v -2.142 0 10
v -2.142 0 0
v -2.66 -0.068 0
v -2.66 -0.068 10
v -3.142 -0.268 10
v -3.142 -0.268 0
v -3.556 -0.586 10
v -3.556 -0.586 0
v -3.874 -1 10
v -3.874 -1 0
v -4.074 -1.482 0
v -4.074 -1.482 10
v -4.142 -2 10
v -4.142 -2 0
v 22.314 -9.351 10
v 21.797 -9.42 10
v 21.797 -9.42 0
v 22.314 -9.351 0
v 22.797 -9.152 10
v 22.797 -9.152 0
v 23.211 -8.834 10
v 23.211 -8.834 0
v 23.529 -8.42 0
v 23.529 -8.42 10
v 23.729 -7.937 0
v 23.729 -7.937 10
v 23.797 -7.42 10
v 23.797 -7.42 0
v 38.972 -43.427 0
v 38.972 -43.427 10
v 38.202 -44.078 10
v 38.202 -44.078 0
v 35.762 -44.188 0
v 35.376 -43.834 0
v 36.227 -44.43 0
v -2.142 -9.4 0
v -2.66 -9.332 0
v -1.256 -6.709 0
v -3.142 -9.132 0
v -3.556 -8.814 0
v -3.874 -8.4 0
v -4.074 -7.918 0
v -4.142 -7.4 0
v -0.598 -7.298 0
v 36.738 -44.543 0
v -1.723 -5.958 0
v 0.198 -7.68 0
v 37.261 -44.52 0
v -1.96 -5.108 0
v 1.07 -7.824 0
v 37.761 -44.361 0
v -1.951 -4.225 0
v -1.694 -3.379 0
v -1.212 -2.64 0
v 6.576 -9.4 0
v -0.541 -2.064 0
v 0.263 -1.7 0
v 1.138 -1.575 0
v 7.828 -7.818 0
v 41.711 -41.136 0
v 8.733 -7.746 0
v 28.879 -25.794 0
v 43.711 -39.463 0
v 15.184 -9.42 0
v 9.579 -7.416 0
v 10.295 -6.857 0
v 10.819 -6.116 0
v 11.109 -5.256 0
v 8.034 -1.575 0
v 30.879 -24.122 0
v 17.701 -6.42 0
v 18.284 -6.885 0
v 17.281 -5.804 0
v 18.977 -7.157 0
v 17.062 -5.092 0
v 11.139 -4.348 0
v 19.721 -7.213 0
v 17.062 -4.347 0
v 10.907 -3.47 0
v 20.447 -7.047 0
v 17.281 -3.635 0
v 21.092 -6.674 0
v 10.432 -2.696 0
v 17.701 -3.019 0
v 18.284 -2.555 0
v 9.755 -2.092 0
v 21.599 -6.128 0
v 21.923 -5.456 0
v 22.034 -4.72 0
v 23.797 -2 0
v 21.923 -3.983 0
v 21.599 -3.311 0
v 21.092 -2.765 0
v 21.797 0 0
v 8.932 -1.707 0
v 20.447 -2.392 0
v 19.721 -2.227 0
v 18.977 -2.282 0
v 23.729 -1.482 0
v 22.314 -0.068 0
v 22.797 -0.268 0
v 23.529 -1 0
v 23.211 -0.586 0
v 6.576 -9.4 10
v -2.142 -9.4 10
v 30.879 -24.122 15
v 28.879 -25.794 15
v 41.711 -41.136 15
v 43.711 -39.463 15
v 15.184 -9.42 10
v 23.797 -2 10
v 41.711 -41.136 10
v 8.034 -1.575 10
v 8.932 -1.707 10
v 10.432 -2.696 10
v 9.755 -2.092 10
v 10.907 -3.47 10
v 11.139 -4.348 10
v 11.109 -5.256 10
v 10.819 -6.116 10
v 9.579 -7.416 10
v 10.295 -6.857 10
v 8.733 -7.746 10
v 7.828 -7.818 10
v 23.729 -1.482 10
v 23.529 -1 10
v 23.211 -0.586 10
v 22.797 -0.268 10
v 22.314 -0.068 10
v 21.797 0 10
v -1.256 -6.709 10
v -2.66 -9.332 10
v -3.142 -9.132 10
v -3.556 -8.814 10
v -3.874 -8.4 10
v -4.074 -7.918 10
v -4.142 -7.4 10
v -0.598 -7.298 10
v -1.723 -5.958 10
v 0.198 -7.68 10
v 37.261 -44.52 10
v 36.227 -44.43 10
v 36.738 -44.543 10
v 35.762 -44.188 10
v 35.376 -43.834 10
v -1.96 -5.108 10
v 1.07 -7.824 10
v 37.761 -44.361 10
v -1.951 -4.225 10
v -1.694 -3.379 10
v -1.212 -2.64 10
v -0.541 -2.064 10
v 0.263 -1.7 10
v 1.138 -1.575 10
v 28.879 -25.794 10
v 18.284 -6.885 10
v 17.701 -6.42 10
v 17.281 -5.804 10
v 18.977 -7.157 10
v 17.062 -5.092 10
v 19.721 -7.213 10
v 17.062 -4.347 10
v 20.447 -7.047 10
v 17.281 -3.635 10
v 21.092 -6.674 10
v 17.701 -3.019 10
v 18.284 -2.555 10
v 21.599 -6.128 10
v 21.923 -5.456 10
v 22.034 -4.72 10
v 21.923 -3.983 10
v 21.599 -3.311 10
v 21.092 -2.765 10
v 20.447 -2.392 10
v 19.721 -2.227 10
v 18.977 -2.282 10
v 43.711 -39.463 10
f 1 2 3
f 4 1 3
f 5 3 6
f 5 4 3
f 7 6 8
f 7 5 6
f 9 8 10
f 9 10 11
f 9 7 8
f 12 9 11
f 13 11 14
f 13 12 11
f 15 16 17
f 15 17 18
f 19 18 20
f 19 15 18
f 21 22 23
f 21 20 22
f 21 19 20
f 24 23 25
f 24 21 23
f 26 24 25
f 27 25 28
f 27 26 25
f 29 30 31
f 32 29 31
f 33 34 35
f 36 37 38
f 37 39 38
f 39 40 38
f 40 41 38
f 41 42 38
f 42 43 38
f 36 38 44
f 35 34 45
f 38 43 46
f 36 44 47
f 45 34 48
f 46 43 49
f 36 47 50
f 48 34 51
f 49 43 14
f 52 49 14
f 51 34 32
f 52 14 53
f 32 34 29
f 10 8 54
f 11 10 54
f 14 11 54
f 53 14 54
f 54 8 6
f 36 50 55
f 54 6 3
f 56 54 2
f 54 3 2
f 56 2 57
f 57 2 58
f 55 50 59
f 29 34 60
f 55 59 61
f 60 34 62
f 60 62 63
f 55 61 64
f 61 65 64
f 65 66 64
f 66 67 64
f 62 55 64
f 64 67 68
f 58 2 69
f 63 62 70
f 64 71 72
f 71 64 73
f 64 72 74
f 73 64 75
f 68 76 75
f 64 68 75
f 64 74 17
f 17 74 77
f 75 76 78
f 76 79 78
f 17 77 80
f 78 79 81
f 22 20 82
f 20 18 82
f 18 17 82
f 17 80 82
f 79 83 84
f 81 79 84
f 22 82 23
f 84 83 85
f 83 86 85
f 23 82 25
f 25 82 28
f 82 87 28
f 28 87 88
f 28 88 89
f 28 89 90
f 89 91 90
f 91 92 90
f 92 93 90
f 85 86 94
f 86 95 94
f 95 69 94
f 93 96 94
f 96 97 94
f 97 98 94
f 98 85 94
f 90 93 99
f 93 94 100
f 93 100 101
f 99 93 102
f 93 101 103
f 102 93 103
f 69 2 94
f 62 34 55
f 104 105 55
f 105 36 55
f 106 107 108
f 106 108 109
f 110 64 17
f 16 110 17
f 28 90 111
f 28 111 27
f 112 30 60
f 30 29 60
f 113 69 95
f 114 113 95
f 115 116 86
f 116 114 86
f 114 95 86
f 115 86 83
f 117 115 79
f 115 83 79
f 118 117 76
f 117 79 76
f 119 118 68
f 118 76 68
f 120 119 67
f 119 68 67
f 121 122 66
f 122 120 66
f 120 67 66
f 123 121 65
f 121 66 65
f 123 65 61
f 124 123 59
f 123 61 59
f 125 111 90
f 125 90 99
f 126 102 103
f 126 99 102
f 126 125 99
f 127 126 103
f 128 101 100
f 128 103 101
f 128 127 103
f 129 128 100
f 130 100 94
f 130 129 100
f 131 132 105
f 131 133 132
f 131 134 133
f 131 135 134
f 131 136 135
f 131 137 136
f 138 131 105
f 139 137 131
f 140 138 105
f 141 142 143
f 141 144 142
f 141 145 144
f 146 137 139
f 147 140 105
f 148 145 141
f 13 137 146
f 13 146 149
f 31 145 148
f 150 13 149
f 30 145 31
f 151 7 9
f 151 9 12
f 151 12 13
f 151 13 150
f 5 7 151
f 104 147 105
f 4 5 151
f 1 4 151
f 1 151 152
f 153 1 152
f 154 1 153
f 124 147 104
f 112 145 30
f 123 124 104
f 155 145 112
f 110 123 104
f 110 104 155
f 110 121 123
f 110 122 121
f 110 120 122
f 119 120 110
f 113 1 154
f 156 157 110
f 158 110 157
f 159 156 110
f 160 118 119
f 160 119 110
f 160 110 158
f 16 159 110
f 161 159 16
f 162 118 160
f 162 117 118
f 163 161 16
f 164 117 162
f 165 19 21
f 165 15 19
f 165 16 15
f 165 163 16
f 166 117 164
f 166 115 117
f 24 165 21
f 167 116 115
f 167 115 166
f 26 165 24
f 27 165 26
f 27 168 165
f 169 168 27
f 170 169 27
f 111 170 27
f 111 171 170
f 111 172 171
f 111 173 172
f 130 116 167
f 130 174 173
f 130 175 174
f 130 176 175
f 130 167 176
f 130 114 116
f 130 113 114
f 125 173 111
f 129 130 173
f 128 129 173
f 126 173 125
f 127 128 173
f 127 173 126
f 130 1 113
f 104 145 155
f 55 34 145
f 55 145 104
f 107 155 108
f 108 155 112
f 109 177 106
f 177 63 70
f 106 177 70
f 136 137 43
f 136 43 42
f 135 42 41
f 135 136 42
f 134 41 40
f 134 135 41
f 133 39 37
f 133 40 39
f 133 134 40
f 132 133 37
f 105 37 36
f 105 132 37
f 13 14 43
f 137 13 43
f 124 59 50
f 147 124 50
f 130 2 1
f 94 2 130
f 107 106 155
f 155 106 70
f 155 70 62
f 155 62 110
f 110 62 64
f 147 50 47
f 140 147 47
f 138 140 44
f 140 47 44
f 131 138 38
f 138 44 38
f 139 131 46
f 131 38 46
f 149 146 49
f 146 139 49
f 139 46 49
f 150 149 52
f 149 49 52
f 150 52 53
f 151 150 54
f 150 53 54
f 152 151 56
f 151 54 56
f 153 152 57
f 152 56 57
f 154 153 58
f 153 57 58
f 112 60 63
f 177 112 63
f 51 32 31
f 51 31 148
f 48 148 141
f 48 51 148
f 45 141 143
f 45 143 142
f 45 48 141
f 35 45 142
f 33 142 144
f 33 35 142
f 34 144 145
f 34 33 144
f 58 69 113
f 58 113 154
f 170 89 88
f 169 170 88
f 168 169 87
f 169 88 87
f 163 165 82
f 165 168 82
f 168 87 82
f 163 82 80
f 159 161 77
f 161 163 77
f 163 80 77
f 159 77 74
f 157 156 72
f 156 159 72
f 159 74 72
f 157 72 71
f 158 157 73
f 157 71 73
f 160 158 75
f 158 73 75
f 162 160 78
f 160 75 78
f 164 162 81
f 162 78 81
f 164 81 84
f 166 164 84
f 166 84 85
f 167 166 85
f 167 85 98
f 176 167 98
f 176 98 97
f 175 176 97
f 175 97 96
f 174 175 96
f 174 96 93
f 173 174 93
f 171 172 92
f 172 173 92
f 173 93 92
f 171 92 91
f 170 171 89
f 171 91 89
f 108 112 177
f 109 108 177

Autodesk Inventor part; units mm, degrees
ref_plane "YZ Plane" through (0, 0, 0) normal (1, 0, 0) x (0, 1, 0)
ref_plane "XZ Plane" through (0, 0, 0) normal (0, 1, 0) x (-1, 0, 0)
ref_plane "XY Plane" through (0, 0, 0) normal (0, 0, 1) x (1, 0, 0)
sketch "スケッチ1" plane through (0, 0, 0) normal (0, 0, 1) x (1, 0, 0)
  line L0 (18.408, 0) -> (-1.0303, 0)
  arc A0 (36.165, -44.7764) -> (37.2594, -44.8743) centre (37.0041, -41.5628) ccw
  line L1 (38.972, -43.427) -> (37.2594, -44.8743)
  line L2 (31.483, -28.9072) -> (15.1835, -9.4196)
  circle A1 centre (19.5337, -4.7196) radius 2.5
  line L3 (8.0337, -1.575) -> (1.1379, -1.575)
  arc A2 (7.8277, -7.8182) -> (8.0337, -1.575) centre (8.0337, -4.7) ccw
  line L4 (7.8277, -7.8182) -> (1.0695, -7.8243)
  arc A3 (1.1379, -1.575) -> (1.0695, -7.8243) centre (1.1379, -4.7) ccw
  line L5 (36.165, -44.7764) -> (6.576, -9.4)
  line L6 (18.408, 0) -> (23.7968, 0)
  line L7 (23.7968, 0) -> (23.7968, -8.35)
  line L8 (-1.0303, 0) -> (-4.1421, 0)
  line L9 (-4.1421, 0) -> (-4.1421, -7.7348)
  line L10 (-4.1421, -7.7348) -> (-4.1421, -9.4)
  line L11 (-4.1421, -9.4) -> (6.576, -9.4)
  line L12 (15.1835, -9.4196) -> (23.7968, -9.4196)
  line L13 (23.7968, -9.4196) -> (23.7968, -7.7545)
  line L14 (41.7112, -41.1359) -> (41.7109, -41.1356)
  line L15 (41.7109, -41.1356) -> (43.7109, -39.4628)
  line L16 (43.7109, -39.4628) -> (30.8794, -24.1216)
  line L17 (30.8794, -24.1216) -> (28.8794, -25.7944)
  line L18 (38.972, -43.427) -> (41.7112, -41.1359)
  line L19 (31.483, -28.9072) -> (41.7112, -41.1359)
  point P0 (0, 0)
  point P1 (0, 0)
  dimension "d0" = 5
  dimension "d1" = 3.125
  dimension "d3" = 11.5
  dimension "d5" = 4.7
  dimension "d9" = 3.125
  dimension "d11" = 4.7
  dimension "d12" = 4.7
  dimension "d13" = 6.8958
  dimension "d14" = 20
  dimension "d19" = 2
  dimension "d24" = 46.1194
  dimension "d25" = 41.3474
extrude "押し出し1" add sketch "スケッチ1" along normal blind 10
fillet "フィレット1" radius 2 4 edges at (23.7968, 0, 5) (23.7968, -9.4196, 5) (-4.1421, 0, 5) (-4.1421, -9.4, 5)
fillet "フィレット2" radius 2 2 edges at (37.2594, -44.8743, 5) (36.165, -44.7764, 5)
sketch "スケッチ4" plane through (0, 0, 10) normal (0, 0, 1) x (1, 0, 0)
  line L0 (30.8794, -24.1216) -> (28.8794, -25.7944) projected
  line L1 (43.7109, -39.4628) -> (30.8794, -24.1216) projected
  line L2 (41.7109, -41.1356) -> (43.7109, -39.4628) projected
  line L3 (28.8794, -25.7944) -> (41.7109, -41.1356)
  line L4 (43.7109, -39.4628) -> (41.7109, -41.1356)
  line L5 (28.8794, -25.7944) -> (30.8794, -24.1216)
  line L6 (30.8794, -24.1216) -> (43.7109, -39.4628)
  point P0 (0, 0)
extrude "押し出し4" add sketch "スケッチ4" along normal blind 5
equation "\"d5\" = d11"
equation "\"d9\" = d1"
properties part number "finger_3"
